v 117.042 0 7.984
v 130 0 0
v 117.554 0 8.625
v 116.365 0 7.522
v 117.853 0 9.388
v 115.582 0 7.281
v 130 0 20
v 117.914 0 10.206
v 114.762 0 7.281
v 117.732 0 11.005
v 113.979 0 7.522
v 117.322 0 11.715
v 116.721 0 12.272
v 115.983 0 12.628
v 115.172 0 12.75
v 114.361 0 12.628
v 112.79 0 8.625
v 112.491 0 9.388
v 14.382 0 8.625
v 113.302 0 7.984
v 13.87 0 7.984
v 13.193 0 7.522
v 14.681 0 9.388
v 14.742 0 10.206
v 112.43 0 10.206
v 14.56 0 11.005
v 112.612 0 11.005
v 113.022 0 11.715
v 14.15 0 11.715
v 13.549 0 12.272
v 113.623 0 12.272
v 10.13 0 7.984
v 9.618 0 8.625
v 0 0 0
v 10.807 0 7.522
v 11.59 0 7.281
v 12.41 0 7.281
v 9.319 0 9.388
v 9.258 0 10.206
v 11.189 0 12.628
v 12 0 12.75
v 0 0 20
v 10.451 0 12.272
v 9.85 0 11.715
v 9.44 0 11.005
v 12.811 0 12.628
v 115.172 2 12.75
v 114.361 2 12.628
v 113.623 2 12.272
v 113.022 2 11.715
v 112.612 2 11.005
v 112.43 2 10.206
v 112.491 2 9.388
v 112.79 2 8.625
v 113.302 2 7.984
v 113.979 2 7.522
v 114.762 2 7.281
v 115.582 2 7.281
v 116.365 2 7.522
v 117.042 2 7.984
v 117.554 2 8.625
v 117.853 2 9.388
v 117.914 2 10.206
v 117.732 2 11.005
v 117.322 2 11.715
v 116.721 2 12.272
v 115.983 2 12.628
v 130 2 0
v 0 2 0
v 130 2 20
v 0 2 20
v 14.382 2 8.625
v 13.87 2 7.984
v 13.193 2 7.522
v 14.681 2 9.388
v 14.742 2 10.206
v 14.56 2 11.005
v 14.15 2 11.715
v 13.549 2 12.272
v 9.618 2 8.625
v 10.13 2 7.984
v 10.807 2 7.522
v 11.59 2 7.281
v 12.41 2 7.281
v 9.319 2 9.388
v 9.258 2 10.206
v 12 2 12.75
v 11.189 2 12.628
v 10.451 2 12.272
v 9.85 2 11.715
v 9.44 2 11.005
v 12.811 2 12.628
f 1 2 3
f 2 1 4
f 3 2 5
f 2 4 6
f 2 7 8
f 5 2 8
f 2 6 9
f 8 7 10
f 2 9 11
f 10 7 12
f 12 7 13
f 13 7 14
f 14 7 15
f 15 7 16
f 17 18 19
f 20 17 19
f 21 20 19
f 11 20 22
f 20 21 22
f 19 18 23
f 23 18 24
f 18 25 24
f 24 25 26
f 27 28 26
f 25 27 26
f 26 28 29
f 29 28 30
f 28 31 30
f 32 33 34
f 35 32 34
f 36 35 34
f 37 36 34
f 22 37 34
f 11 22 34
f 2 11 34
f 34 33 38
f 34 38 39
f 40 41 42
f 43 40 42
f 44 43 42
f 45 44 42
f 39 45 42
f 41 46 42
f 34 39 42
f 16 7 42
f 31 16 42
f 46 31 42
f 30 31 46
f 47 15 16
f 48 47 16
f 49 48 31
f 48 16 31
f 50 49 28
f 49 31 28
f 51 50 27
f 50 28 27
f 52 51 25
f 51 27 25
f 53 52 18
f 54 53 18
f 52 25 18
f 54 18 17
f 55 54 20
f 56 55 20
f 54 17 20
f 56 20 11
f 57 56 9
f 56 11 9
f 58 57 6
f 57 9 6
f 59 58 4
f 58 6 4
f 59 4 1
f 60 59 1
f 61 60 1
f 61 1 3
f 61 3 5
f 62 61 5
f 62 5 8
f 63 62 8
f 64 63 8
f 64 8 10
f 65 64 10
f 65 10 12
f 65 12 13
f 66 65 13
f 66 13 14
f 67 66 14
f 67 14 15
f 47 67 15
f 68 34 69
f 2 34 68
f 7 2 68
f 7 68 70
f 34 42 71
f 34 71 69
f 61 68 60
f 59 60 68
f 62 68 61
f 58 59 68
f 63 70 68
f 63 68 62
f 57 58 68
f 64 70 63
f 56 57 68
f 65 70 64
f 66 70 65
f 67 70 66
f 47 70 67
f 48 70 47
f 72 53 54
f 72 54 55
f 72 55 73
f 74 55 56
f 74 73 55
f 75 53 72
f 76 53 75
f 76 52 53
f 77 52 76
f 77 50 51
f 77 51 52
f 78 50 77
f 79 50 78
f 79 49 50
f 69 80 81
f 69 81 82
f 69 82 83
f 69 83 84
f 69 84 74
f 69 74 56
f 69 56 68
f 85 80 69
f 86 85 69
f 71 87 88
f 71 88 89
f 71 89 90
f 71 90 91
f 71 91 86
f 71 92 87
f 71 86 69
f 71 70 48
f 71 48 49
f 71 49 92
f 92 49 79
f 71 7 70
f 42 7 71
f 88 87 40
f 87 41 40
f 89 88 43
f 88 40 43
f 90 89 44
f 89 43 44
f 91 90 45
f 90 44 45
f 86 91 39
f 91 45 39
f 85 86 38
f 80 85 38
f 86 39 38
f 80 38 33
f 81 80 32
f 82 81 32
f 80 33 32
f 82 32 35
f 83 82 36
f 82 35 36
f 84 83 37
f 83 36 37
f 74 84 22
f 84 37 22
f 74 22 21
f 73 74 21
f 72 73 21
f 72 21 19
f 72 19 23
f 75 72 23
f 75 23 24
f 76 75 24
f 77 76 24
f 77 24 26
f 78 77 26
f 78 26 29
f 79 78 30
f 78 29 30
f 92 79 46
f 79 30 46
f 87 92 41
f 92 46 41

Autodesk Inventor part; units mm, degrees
ref_plane "YZ Plane" through (0, 0, 0) normal (1, 0, 0) x (0, 1, 0)
ref_plane "XZ Plane" through (0, 0, 0) normal (0, 1, 0) x (-1, 0, 0)
ref_plane "XY Plane" through (0, 0, 0) normal (0, 0, 1) x (1, 0, 0)
sketch "Sketch1" plane through (0, 0, 0) normal (0, 1, 0) x (-1, 0, 0)
  line L0 (0, 0) -> (-130, 0)
  line L1 (-130, 0) -> (-130, 20)
  line L2 (-130, 20) -> (0, 20)
  line L3 (0, 20) -> (0, 0)
  dimension "d0" = 130
  dimension "d1" = 20
extrude "Extrusion1" add sketch "Sketch1" along normal blind 2
hole "Hole1" at (12, 2, 10) direction (0, -1, 0) diameter 5.5 end through all
pattern_linear "Rectangular Pattern1" count 2 spacing 103.172 along (1, 0, 0) of "Hole1"
properties part number "lastflat bar" material "Aluminum 6061"
